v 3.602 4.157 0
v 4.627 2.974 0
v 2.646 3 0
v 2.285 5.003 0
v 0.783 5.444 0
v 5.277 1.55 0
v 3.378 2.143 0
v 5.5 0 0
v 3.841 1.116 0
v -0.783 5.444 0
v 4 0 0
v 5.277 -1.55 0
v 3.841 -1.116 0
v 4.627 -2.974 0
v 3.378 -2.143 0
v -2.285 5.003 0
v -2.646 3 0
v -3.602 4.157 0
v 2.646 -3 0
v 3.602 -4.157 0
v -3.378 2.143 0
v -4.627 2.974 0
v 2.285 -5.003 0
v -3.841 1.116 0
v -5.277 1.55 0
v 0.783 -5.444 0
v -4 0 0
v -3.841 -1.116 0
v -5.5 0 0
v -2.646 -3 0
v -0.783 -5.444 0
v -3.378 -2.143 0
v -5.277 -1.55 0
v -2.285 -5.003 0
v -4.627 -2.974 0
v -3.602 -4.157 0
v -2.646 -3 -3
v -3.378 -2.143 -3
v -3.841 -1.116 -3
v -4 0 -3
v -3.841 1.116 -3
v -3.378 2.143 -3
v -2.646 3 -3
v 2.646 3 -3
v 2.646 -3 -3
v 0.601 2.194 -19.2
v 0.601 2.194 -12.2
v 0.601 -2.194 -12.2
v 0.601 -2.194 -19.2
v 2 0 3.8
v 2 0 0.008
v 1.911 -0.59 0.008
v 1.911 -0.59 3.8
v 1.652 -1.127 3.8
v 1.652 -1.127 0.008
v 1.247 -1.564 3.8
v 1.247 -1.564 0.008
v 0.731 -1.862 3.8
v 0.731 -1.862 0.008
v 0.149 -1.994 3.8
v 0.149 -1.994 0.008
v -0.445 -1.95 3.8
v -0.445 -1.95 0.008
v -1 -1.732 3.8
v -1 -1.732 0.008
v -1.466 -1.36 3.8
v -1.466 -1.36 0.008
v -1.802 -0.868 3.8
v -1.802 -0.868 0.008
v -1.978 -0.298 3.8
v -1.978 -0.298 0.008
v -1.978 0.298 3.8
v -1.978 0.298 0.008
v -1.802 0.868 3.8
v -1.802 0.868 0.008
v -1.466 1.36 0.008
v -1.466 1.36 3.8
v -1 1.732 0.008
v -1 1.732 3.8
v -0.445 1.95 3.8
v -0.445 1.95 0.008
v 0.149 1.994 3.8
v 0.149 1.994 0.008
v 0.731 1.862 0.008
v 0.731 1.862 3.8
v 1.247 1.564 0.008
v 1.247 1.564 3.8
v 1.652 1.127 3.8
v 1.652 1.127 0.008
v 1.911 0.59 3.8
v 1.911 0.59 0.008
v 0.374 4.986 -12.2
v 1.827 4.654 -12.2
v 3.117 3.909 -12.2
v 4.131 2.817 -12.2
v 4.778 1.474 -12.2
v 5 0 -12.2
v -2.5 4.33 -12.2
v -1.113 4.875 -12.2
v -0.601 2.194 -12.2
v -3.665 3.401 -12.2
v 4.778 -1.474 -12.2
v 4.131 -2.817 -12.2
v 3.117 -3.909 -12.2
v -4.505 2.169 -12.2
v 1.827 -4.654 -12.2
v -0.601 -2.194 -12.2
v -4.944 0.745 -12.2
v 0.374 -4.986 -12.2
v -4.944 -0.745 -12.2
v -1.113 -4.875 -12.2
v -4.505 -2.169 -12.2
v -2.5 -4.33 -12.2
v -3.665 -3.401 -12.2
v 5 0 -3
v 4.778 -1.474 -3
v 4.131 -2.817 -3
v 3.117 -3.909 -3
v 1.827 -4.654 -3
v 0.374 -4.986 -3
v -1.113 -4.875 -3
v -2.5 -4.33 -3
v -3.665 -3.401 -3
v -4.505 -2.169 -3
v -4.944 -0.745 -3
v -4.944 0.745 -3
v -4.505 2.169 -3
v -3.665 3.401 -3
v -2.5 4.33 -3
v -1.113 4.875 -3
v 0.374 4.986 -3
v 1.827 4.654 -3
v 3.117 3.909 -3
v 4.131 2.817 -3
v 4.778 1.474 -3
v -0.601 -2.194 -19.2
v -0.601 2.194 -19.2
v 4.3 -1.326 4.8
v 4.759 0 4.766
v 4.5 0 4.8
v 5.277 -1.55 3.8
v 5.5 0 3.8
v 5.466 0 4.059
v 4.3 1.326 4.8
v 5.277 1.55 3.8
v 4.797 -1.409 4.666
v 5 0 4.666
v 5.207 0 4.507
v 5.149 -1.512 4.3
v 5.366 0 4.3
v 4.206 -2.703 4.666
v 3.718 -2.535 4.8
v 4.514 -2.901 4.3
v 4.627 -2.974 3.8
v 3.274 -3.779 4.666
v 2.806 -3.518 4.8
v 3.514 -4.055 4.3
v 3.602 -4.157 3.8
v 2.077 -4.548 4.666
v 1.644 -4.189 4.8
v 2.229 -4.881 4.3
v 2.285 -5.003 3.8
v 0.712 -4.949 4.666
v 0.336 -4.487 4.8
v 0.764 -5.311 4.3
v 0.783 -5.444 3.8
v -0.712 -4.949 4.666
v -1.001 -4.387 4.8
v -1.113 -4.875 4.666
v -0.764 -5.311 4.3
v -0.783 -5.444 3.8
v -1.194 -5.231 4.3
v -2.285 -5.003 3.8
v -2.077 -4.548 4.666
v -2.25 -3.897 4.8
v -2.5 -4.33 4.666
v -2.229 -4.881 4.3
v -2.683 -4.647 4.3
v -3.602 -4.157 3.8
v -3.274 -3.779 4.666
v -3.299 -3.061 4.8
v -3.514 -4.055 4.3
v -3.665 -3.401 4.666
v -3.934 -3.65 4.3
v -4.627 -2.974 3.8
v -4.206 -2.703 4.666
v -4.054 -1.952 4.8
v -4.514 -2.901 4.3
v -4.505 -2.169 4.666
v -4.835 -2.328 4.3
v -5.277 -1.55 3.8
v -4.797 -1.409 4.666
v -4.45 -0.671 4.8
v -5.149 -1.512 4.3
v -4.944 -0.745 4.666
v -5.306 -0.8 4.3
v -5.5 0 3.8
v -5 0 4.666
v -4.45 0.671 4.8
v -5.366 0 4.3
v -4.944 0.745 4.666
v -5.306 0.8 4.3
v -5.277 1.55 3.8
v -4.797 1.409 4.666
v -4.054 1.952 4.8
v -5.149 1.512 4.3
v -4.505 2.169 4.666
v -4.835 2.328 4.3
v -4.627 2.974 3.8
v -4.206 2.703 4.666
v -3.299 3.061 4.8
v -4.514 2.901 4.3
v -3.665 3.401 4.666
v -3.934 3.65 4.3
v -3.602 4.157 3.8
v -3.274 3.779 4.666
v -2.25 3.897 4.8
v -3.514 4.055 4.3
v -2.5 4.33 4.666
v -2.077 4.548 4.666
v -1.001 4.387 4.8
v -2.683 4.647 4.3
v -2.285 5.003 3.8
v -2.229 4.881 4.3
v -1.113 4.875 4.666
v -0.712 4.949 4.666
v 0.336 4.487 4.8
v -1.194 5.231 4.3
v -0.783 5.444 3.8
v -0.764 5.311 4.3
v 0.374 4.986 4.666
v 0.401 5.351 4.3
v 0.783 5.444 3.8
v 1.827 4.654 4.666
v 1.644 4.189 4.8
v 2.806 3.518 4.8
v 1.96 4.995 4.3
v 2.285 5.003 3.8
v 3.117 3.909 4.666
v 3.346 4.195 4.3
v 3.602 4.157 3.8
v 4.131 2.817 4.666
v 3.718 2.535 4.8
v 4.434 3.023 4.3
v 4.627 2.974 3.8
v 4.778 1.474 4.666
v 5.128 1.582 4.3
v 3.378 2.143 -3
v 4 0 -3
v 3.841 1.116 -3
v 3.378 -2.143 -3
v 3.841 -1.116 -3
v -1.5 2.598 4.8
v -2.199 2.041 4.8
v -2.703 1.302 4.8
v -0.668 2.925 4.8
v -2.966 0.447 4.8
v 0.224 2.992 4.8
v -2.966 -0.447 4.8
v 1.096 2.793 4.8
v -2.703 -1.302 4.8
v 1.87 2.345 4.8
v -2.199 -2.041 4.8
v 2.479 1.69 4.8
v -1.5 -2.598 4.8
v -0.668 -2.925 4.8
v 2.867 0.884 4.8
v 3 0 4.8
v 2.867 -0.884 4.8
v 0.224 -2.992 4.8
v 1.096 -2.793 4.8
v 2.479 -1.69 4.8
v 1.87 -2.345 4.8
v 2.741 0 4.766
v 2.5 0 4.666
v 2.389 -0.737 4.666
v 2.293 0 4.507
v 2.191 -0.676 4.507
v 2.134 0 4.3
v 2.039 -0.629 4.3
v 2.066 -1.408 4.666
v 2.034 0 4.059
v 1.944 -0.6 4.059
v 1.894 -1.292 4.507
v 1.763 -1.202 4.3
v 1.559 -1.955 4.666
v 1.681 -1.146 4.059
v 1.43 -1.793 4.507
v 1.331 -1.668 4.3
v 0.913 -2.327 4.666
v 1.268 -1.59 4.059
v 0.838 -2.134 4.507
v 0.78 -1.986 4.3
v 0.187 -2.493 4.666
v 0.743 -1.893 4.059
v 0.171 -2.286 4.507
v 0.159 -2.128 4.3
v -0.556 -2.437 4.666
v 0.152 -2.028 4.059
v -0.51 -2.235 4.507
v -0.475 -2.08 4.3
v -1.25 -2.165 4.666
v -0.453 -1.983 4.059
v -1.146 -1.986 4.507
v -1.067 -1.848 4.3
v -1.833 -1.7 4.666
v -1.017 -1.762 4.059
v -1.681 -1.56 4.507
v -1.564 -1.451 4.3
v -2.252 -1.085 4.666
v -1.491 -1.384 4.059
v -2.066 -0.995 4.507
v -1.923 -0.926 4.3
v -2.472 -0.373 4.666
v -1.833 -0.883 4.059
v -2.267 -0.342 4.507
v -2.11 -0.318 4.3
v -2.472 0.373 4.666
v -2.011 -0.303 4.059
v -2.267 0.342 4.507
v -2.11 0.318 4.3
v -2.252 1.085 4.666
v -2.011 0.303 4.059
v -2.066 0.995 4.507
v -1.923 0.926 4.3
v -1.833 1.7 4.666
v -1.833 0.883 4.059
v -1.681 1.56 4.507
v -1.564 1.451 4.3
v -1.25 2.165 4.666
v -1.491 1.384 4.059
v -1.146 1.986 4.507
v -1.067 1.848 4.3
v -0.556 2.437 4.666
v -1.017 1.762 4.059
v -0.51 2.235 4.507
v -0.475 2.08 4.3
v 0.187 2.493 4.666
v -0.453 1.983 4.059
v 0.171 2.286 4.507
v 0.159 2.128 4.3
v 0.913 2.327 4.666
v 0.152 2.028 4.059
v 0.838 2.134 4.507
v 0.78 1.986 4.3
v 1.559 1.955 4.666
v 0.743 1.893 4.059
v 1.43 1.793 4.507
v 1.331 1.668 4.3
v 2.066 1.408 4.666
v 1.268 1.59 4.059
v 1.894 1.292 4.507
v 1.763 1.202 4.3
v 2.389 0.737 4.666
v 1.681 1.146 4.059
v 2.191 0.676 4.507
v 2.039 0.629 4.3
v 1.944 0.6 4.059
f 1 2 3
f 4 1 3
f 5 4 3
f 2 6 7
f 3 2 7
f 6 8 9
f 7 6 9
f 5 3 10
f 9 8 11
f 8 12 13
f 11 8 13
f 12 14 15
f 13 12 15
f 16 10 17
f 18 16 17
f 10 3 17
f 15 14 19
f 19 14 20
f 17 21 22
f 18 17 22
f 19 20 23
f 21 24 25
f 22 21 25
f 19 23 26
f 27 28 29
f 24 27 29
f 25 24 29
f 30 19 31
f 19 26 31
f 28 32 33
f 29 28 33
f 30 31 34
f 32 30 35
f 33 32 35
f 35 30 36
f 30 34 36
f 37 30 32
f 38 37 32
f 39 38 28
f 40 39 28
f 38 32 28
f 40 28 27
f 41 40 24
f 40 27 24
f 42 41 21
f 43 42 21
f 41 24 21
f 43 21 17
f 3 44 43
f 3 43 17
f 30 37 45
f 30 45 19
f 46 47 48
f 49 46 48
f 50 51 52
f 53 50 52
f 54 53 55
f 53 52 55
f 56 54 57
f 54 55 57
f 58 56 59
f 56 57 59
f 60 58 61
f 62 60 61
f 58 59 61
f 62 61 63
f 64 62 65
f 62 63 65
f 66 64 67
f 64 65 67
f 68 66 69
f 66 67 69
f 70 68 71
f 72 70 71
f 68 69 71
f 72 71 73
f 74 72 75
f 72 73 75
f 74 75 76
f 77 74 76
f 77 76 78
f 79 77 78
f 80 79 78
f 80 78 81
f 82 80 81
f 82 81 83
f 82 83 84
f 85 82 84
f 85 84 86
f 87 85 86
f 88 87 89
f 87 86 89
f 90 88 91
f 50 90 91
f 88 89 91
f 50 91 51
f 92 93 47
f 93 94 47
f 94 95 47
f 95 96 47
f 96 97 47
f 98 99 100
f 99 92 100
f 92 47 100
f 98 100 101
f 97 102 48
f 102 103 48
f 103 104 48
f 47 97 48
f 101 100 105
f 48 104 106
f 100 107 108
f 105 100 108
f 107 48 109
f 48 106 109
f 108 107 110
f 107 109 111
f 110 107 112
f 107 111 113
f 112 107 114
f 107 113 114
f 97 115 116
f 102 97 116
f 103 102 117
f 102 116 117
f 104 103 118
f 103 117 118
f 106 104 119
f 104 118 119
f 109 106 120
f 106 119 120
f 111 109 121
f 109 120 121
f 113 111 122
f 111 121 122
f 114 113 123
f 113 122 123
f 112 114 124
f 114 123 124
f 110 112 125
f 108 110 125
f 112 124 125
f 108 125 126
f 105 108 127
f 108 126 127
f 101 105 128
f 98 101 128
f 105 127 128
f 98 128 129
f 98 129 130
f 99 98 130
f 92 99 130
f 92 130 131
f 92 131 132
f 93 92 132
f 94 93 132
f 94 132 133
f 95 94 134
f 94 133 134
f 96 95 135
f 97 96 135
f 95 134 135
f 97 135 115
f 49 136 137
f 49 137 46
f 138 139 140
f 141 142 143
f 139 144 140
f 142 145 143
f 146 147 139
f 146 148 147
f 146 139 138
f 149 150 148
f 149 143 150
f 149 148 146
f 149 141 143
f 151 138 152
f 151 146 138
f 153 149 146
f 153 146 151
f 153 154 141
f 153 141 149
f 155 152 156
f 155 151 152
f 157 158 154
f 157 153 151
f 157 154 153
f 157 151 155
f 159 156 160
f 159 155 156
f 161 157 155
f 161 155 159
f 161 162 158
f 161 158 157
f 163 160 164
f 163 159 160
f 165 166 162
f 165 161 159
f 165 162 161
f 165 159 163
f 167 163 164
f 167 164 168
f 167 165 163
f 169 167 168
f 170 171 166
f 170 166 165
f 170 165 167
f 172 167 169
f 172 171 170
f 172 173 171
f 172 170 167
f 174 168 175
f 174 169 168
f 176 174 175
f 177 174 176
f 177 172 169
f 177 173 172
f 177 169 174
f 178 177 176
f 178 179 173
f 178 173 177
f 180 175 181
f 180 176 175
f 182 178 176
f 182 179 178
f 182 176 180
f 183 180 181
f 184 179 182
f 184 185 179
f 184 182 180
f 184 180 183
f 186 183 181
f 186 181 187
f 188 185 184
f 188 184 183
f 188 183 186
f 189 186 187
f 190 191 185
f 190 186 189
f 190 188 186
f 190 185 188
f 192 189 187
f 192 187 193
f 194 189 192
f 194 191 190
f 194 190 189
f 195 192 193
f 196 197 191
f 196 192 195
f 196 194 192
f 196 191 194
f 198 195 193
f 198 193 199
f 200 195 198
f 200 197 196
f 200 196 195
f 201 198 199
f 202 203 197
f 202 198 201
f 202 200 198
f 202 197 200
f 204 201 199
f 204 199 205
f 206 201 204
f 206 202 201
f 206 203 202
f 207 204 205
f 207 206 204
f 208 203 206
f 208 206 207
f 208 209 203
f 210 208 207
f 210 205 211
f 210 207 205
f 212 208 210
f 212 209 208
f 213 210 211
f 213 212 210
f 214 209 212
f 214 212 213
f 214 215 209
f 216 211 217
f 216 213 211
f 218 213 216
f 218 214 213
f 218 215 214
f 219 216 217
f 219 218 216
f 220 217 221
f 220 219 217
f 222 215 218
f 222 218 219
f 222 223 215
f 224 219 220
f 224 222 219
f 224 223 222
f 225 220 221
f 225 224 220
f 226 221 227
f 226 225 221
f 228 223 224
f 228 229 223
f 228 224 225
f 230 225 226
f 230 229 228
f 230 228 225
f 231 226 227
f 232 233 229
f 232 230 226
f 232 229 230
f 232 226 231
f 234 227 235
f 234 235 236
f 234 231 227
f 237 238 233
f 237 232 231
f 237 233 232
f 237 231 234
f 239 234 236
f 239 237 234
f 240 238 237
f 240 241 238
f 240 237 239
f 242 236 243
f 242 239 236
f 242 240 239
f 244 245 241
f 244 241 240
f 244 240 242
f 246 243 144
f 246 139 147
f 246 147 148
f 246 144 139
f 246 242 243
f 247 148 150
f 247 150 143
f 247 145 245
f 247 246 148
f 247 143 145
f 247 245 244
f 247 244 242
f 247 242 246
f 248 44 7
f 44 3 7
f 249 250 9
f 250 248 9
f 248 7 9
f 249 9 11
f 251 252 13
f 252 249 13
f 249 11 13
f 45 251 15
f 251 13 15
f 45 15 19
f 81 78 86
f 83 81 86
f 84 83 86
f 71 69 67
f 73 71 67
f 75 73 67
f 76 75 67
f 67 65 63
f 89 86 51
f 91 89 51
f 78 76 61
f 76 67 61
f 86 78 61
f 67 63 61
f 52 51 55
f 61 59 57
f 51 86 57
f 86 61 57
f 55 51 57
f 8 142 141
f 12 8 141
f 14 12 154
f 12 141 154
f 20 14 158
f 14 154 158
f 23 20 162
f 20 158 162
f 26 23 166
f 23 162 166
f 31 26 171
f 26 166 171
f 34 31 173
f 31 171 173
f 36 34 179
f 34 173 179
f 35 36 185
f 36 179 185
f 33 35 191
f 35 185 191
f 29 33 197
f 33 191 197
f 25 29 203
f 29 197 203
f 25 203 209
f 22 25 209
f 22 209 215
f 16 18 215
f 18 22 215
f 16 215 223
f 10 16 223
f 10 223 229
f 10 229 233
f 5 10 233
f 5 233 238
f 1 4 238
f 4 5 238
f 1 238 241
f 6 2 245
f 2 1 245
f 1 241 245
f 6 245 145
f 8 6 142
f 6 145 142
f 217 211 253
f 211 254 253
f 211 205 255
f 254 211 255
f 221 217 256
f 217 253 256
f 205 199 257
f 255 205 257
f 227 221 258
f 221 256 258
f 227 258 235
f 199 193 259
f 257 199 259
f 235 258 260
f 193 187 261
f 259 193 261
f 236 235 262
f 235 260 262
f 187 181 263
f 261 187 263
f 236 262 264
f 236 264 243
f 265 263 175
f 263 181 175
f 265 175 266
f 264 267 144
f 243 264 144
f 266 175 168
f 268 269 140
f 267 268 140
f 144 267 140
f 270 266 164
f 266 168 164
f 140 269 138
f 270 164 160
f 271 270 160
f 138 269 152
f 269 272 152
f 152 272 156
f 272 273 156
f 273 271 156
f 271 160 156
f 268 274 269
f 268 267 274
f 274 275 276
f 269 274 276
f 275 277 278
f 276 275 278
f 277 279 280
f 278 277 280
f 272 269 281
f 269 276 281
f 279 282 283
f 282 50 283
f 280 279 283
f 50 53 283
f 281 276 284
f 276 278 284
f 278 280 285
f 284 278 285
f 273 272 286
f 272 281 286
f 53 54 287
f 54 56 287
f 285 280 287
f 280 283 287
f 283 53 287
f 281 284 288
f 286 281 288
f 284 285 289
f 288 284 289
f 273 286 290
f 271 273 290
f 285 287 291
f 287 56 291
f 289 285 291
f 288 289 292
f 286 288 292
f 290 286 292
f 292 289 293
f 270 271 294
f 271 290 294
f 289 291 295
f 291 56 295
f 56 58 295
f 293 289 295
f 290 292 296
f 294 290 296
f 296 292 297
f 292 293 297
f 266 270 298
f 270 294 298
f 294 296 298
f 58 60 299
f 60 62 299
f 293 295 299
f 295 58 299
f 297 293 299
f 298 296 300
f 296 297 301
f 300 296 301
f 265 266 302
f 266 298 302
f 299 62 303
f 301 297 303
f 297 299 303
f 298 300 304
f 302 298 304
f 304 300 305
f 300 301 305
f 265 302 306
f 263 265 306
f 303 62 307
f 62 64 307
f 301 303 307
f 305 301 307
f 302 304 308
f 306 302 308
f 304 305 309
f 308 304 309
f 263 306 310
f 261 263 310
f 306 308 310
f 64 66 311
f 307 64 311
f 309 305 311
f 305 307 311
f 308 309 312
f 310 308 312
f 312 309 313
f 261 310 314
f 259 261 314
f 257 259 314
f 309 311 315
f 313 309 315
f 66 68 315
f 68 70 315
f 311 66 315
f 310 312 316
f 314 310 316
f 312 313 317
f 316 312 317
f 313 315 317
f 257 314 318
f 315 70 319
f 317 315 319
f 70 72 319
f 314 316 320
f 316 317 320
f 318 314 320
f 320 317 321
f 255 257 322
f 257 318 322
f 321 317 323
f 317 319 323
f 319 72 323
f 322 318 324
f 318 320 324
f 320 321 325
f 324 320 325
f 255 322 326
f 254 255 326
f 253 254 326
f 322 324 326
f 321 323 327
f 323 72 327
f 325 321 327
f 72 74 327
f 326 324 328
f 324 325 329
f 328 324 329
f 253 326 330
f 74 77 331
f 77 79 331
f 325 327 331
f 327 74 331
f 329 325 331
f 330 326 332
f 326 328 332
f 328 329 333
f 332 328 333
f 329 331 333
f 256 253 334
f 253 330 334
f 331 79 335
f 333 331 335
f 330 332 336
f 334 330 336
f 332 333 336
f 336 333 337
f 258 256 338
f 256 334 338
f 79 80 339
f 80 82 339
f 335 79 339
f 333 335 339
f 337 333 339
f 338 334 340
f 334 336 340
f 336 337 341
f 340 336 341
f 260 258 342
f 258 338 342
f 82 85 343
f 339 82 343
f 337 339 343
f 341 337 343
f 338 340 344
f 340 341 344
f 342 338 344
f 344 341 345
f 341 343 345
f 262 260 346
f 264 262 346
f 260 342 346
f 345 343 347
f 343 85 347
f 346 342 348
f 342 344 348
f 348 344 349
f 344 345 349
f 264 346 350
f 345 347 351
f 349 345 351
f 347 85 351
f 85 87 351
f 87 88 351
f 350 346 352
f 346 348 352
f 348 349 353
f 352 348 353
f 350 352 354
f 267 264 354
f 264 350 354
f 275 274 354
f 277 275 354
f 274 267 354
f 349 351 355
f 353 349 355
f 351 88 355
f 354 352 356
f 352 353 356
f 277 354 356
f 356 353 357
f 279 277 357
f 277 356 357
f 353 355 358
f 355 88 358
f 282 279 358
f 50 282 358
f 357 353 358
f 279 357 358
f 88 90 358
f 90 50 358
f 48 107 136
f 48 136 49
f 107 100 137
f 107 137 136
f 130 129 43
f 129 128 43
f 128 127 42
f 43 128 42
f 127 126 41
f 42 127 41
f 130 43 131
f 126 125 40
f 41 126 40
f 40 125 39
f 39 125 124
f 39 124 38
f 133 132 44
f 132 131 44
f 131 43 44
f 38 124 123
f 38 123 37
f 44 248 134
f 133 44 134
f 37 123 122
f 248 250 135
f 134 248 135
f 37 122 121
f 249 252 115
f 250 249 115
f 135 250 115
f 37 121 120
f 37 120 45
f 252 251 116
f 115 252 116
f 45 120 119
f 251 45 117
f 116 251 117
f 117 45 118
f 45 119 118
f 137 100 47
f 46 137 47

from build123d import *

# Parameters (mm, degrees)
F2_R     = 1
F3_W     = 1.2023348827
F3_H     = 4.3877884746
F4_DEPTH = 7
F5_W     = 1.6818879384
F5_H     = 3
F5_W_2   = 1.39512593
F6_DEPTH = 12.5


with BuildPart() as f1:
    # F0 (on Front) → F1 (revolve)
    with BuildSketch(Plane.XZ):
        Polygon((5.5, 4.8), (2, 4.8), (2, 0.0084556759), (0, 0.0084556759), (0, -12.2), (5, -12.2), (5, -3), (4, -3), (4, 0), (5.5, 0), align=None)
    revolve(axis=Axis((0, 0, 13.3898657501), (0, 0, -1)))

    # F2
    f2_edges = [f1.edges().sort_by_distance(p)[0] for p in [
        (-5.5, 0, 4.8),
        (-2, 0, 4.8),
    ]]
    fillet(f2_edges, radius=F2_R)

    # F3 (on face) → F4 (join)
    with BuildSketch(Plane(origin=(0, 0, -12.2), x_dir=(1, 0, 0), z_dir=(0, 0, -1))):
        Rectangle(F3_W, F3_H)
    extrude(amount=F4_DEPTH)

    # F5 (on Right) → F6 (cut, symmetric)
    with BuildSketch(Plane.YZ):
        with Locations((3.8409439692, -1.5)):
            Rectangle(F5_W, F5_H)
        with Locations((-3.697562965, -1.5)):
            Rectangle(F5_W_2, F5_H)
    extrude(amount=F6_DEPTH, both=True, mode=Mode.SUBTRACT)


solid = f1.part
